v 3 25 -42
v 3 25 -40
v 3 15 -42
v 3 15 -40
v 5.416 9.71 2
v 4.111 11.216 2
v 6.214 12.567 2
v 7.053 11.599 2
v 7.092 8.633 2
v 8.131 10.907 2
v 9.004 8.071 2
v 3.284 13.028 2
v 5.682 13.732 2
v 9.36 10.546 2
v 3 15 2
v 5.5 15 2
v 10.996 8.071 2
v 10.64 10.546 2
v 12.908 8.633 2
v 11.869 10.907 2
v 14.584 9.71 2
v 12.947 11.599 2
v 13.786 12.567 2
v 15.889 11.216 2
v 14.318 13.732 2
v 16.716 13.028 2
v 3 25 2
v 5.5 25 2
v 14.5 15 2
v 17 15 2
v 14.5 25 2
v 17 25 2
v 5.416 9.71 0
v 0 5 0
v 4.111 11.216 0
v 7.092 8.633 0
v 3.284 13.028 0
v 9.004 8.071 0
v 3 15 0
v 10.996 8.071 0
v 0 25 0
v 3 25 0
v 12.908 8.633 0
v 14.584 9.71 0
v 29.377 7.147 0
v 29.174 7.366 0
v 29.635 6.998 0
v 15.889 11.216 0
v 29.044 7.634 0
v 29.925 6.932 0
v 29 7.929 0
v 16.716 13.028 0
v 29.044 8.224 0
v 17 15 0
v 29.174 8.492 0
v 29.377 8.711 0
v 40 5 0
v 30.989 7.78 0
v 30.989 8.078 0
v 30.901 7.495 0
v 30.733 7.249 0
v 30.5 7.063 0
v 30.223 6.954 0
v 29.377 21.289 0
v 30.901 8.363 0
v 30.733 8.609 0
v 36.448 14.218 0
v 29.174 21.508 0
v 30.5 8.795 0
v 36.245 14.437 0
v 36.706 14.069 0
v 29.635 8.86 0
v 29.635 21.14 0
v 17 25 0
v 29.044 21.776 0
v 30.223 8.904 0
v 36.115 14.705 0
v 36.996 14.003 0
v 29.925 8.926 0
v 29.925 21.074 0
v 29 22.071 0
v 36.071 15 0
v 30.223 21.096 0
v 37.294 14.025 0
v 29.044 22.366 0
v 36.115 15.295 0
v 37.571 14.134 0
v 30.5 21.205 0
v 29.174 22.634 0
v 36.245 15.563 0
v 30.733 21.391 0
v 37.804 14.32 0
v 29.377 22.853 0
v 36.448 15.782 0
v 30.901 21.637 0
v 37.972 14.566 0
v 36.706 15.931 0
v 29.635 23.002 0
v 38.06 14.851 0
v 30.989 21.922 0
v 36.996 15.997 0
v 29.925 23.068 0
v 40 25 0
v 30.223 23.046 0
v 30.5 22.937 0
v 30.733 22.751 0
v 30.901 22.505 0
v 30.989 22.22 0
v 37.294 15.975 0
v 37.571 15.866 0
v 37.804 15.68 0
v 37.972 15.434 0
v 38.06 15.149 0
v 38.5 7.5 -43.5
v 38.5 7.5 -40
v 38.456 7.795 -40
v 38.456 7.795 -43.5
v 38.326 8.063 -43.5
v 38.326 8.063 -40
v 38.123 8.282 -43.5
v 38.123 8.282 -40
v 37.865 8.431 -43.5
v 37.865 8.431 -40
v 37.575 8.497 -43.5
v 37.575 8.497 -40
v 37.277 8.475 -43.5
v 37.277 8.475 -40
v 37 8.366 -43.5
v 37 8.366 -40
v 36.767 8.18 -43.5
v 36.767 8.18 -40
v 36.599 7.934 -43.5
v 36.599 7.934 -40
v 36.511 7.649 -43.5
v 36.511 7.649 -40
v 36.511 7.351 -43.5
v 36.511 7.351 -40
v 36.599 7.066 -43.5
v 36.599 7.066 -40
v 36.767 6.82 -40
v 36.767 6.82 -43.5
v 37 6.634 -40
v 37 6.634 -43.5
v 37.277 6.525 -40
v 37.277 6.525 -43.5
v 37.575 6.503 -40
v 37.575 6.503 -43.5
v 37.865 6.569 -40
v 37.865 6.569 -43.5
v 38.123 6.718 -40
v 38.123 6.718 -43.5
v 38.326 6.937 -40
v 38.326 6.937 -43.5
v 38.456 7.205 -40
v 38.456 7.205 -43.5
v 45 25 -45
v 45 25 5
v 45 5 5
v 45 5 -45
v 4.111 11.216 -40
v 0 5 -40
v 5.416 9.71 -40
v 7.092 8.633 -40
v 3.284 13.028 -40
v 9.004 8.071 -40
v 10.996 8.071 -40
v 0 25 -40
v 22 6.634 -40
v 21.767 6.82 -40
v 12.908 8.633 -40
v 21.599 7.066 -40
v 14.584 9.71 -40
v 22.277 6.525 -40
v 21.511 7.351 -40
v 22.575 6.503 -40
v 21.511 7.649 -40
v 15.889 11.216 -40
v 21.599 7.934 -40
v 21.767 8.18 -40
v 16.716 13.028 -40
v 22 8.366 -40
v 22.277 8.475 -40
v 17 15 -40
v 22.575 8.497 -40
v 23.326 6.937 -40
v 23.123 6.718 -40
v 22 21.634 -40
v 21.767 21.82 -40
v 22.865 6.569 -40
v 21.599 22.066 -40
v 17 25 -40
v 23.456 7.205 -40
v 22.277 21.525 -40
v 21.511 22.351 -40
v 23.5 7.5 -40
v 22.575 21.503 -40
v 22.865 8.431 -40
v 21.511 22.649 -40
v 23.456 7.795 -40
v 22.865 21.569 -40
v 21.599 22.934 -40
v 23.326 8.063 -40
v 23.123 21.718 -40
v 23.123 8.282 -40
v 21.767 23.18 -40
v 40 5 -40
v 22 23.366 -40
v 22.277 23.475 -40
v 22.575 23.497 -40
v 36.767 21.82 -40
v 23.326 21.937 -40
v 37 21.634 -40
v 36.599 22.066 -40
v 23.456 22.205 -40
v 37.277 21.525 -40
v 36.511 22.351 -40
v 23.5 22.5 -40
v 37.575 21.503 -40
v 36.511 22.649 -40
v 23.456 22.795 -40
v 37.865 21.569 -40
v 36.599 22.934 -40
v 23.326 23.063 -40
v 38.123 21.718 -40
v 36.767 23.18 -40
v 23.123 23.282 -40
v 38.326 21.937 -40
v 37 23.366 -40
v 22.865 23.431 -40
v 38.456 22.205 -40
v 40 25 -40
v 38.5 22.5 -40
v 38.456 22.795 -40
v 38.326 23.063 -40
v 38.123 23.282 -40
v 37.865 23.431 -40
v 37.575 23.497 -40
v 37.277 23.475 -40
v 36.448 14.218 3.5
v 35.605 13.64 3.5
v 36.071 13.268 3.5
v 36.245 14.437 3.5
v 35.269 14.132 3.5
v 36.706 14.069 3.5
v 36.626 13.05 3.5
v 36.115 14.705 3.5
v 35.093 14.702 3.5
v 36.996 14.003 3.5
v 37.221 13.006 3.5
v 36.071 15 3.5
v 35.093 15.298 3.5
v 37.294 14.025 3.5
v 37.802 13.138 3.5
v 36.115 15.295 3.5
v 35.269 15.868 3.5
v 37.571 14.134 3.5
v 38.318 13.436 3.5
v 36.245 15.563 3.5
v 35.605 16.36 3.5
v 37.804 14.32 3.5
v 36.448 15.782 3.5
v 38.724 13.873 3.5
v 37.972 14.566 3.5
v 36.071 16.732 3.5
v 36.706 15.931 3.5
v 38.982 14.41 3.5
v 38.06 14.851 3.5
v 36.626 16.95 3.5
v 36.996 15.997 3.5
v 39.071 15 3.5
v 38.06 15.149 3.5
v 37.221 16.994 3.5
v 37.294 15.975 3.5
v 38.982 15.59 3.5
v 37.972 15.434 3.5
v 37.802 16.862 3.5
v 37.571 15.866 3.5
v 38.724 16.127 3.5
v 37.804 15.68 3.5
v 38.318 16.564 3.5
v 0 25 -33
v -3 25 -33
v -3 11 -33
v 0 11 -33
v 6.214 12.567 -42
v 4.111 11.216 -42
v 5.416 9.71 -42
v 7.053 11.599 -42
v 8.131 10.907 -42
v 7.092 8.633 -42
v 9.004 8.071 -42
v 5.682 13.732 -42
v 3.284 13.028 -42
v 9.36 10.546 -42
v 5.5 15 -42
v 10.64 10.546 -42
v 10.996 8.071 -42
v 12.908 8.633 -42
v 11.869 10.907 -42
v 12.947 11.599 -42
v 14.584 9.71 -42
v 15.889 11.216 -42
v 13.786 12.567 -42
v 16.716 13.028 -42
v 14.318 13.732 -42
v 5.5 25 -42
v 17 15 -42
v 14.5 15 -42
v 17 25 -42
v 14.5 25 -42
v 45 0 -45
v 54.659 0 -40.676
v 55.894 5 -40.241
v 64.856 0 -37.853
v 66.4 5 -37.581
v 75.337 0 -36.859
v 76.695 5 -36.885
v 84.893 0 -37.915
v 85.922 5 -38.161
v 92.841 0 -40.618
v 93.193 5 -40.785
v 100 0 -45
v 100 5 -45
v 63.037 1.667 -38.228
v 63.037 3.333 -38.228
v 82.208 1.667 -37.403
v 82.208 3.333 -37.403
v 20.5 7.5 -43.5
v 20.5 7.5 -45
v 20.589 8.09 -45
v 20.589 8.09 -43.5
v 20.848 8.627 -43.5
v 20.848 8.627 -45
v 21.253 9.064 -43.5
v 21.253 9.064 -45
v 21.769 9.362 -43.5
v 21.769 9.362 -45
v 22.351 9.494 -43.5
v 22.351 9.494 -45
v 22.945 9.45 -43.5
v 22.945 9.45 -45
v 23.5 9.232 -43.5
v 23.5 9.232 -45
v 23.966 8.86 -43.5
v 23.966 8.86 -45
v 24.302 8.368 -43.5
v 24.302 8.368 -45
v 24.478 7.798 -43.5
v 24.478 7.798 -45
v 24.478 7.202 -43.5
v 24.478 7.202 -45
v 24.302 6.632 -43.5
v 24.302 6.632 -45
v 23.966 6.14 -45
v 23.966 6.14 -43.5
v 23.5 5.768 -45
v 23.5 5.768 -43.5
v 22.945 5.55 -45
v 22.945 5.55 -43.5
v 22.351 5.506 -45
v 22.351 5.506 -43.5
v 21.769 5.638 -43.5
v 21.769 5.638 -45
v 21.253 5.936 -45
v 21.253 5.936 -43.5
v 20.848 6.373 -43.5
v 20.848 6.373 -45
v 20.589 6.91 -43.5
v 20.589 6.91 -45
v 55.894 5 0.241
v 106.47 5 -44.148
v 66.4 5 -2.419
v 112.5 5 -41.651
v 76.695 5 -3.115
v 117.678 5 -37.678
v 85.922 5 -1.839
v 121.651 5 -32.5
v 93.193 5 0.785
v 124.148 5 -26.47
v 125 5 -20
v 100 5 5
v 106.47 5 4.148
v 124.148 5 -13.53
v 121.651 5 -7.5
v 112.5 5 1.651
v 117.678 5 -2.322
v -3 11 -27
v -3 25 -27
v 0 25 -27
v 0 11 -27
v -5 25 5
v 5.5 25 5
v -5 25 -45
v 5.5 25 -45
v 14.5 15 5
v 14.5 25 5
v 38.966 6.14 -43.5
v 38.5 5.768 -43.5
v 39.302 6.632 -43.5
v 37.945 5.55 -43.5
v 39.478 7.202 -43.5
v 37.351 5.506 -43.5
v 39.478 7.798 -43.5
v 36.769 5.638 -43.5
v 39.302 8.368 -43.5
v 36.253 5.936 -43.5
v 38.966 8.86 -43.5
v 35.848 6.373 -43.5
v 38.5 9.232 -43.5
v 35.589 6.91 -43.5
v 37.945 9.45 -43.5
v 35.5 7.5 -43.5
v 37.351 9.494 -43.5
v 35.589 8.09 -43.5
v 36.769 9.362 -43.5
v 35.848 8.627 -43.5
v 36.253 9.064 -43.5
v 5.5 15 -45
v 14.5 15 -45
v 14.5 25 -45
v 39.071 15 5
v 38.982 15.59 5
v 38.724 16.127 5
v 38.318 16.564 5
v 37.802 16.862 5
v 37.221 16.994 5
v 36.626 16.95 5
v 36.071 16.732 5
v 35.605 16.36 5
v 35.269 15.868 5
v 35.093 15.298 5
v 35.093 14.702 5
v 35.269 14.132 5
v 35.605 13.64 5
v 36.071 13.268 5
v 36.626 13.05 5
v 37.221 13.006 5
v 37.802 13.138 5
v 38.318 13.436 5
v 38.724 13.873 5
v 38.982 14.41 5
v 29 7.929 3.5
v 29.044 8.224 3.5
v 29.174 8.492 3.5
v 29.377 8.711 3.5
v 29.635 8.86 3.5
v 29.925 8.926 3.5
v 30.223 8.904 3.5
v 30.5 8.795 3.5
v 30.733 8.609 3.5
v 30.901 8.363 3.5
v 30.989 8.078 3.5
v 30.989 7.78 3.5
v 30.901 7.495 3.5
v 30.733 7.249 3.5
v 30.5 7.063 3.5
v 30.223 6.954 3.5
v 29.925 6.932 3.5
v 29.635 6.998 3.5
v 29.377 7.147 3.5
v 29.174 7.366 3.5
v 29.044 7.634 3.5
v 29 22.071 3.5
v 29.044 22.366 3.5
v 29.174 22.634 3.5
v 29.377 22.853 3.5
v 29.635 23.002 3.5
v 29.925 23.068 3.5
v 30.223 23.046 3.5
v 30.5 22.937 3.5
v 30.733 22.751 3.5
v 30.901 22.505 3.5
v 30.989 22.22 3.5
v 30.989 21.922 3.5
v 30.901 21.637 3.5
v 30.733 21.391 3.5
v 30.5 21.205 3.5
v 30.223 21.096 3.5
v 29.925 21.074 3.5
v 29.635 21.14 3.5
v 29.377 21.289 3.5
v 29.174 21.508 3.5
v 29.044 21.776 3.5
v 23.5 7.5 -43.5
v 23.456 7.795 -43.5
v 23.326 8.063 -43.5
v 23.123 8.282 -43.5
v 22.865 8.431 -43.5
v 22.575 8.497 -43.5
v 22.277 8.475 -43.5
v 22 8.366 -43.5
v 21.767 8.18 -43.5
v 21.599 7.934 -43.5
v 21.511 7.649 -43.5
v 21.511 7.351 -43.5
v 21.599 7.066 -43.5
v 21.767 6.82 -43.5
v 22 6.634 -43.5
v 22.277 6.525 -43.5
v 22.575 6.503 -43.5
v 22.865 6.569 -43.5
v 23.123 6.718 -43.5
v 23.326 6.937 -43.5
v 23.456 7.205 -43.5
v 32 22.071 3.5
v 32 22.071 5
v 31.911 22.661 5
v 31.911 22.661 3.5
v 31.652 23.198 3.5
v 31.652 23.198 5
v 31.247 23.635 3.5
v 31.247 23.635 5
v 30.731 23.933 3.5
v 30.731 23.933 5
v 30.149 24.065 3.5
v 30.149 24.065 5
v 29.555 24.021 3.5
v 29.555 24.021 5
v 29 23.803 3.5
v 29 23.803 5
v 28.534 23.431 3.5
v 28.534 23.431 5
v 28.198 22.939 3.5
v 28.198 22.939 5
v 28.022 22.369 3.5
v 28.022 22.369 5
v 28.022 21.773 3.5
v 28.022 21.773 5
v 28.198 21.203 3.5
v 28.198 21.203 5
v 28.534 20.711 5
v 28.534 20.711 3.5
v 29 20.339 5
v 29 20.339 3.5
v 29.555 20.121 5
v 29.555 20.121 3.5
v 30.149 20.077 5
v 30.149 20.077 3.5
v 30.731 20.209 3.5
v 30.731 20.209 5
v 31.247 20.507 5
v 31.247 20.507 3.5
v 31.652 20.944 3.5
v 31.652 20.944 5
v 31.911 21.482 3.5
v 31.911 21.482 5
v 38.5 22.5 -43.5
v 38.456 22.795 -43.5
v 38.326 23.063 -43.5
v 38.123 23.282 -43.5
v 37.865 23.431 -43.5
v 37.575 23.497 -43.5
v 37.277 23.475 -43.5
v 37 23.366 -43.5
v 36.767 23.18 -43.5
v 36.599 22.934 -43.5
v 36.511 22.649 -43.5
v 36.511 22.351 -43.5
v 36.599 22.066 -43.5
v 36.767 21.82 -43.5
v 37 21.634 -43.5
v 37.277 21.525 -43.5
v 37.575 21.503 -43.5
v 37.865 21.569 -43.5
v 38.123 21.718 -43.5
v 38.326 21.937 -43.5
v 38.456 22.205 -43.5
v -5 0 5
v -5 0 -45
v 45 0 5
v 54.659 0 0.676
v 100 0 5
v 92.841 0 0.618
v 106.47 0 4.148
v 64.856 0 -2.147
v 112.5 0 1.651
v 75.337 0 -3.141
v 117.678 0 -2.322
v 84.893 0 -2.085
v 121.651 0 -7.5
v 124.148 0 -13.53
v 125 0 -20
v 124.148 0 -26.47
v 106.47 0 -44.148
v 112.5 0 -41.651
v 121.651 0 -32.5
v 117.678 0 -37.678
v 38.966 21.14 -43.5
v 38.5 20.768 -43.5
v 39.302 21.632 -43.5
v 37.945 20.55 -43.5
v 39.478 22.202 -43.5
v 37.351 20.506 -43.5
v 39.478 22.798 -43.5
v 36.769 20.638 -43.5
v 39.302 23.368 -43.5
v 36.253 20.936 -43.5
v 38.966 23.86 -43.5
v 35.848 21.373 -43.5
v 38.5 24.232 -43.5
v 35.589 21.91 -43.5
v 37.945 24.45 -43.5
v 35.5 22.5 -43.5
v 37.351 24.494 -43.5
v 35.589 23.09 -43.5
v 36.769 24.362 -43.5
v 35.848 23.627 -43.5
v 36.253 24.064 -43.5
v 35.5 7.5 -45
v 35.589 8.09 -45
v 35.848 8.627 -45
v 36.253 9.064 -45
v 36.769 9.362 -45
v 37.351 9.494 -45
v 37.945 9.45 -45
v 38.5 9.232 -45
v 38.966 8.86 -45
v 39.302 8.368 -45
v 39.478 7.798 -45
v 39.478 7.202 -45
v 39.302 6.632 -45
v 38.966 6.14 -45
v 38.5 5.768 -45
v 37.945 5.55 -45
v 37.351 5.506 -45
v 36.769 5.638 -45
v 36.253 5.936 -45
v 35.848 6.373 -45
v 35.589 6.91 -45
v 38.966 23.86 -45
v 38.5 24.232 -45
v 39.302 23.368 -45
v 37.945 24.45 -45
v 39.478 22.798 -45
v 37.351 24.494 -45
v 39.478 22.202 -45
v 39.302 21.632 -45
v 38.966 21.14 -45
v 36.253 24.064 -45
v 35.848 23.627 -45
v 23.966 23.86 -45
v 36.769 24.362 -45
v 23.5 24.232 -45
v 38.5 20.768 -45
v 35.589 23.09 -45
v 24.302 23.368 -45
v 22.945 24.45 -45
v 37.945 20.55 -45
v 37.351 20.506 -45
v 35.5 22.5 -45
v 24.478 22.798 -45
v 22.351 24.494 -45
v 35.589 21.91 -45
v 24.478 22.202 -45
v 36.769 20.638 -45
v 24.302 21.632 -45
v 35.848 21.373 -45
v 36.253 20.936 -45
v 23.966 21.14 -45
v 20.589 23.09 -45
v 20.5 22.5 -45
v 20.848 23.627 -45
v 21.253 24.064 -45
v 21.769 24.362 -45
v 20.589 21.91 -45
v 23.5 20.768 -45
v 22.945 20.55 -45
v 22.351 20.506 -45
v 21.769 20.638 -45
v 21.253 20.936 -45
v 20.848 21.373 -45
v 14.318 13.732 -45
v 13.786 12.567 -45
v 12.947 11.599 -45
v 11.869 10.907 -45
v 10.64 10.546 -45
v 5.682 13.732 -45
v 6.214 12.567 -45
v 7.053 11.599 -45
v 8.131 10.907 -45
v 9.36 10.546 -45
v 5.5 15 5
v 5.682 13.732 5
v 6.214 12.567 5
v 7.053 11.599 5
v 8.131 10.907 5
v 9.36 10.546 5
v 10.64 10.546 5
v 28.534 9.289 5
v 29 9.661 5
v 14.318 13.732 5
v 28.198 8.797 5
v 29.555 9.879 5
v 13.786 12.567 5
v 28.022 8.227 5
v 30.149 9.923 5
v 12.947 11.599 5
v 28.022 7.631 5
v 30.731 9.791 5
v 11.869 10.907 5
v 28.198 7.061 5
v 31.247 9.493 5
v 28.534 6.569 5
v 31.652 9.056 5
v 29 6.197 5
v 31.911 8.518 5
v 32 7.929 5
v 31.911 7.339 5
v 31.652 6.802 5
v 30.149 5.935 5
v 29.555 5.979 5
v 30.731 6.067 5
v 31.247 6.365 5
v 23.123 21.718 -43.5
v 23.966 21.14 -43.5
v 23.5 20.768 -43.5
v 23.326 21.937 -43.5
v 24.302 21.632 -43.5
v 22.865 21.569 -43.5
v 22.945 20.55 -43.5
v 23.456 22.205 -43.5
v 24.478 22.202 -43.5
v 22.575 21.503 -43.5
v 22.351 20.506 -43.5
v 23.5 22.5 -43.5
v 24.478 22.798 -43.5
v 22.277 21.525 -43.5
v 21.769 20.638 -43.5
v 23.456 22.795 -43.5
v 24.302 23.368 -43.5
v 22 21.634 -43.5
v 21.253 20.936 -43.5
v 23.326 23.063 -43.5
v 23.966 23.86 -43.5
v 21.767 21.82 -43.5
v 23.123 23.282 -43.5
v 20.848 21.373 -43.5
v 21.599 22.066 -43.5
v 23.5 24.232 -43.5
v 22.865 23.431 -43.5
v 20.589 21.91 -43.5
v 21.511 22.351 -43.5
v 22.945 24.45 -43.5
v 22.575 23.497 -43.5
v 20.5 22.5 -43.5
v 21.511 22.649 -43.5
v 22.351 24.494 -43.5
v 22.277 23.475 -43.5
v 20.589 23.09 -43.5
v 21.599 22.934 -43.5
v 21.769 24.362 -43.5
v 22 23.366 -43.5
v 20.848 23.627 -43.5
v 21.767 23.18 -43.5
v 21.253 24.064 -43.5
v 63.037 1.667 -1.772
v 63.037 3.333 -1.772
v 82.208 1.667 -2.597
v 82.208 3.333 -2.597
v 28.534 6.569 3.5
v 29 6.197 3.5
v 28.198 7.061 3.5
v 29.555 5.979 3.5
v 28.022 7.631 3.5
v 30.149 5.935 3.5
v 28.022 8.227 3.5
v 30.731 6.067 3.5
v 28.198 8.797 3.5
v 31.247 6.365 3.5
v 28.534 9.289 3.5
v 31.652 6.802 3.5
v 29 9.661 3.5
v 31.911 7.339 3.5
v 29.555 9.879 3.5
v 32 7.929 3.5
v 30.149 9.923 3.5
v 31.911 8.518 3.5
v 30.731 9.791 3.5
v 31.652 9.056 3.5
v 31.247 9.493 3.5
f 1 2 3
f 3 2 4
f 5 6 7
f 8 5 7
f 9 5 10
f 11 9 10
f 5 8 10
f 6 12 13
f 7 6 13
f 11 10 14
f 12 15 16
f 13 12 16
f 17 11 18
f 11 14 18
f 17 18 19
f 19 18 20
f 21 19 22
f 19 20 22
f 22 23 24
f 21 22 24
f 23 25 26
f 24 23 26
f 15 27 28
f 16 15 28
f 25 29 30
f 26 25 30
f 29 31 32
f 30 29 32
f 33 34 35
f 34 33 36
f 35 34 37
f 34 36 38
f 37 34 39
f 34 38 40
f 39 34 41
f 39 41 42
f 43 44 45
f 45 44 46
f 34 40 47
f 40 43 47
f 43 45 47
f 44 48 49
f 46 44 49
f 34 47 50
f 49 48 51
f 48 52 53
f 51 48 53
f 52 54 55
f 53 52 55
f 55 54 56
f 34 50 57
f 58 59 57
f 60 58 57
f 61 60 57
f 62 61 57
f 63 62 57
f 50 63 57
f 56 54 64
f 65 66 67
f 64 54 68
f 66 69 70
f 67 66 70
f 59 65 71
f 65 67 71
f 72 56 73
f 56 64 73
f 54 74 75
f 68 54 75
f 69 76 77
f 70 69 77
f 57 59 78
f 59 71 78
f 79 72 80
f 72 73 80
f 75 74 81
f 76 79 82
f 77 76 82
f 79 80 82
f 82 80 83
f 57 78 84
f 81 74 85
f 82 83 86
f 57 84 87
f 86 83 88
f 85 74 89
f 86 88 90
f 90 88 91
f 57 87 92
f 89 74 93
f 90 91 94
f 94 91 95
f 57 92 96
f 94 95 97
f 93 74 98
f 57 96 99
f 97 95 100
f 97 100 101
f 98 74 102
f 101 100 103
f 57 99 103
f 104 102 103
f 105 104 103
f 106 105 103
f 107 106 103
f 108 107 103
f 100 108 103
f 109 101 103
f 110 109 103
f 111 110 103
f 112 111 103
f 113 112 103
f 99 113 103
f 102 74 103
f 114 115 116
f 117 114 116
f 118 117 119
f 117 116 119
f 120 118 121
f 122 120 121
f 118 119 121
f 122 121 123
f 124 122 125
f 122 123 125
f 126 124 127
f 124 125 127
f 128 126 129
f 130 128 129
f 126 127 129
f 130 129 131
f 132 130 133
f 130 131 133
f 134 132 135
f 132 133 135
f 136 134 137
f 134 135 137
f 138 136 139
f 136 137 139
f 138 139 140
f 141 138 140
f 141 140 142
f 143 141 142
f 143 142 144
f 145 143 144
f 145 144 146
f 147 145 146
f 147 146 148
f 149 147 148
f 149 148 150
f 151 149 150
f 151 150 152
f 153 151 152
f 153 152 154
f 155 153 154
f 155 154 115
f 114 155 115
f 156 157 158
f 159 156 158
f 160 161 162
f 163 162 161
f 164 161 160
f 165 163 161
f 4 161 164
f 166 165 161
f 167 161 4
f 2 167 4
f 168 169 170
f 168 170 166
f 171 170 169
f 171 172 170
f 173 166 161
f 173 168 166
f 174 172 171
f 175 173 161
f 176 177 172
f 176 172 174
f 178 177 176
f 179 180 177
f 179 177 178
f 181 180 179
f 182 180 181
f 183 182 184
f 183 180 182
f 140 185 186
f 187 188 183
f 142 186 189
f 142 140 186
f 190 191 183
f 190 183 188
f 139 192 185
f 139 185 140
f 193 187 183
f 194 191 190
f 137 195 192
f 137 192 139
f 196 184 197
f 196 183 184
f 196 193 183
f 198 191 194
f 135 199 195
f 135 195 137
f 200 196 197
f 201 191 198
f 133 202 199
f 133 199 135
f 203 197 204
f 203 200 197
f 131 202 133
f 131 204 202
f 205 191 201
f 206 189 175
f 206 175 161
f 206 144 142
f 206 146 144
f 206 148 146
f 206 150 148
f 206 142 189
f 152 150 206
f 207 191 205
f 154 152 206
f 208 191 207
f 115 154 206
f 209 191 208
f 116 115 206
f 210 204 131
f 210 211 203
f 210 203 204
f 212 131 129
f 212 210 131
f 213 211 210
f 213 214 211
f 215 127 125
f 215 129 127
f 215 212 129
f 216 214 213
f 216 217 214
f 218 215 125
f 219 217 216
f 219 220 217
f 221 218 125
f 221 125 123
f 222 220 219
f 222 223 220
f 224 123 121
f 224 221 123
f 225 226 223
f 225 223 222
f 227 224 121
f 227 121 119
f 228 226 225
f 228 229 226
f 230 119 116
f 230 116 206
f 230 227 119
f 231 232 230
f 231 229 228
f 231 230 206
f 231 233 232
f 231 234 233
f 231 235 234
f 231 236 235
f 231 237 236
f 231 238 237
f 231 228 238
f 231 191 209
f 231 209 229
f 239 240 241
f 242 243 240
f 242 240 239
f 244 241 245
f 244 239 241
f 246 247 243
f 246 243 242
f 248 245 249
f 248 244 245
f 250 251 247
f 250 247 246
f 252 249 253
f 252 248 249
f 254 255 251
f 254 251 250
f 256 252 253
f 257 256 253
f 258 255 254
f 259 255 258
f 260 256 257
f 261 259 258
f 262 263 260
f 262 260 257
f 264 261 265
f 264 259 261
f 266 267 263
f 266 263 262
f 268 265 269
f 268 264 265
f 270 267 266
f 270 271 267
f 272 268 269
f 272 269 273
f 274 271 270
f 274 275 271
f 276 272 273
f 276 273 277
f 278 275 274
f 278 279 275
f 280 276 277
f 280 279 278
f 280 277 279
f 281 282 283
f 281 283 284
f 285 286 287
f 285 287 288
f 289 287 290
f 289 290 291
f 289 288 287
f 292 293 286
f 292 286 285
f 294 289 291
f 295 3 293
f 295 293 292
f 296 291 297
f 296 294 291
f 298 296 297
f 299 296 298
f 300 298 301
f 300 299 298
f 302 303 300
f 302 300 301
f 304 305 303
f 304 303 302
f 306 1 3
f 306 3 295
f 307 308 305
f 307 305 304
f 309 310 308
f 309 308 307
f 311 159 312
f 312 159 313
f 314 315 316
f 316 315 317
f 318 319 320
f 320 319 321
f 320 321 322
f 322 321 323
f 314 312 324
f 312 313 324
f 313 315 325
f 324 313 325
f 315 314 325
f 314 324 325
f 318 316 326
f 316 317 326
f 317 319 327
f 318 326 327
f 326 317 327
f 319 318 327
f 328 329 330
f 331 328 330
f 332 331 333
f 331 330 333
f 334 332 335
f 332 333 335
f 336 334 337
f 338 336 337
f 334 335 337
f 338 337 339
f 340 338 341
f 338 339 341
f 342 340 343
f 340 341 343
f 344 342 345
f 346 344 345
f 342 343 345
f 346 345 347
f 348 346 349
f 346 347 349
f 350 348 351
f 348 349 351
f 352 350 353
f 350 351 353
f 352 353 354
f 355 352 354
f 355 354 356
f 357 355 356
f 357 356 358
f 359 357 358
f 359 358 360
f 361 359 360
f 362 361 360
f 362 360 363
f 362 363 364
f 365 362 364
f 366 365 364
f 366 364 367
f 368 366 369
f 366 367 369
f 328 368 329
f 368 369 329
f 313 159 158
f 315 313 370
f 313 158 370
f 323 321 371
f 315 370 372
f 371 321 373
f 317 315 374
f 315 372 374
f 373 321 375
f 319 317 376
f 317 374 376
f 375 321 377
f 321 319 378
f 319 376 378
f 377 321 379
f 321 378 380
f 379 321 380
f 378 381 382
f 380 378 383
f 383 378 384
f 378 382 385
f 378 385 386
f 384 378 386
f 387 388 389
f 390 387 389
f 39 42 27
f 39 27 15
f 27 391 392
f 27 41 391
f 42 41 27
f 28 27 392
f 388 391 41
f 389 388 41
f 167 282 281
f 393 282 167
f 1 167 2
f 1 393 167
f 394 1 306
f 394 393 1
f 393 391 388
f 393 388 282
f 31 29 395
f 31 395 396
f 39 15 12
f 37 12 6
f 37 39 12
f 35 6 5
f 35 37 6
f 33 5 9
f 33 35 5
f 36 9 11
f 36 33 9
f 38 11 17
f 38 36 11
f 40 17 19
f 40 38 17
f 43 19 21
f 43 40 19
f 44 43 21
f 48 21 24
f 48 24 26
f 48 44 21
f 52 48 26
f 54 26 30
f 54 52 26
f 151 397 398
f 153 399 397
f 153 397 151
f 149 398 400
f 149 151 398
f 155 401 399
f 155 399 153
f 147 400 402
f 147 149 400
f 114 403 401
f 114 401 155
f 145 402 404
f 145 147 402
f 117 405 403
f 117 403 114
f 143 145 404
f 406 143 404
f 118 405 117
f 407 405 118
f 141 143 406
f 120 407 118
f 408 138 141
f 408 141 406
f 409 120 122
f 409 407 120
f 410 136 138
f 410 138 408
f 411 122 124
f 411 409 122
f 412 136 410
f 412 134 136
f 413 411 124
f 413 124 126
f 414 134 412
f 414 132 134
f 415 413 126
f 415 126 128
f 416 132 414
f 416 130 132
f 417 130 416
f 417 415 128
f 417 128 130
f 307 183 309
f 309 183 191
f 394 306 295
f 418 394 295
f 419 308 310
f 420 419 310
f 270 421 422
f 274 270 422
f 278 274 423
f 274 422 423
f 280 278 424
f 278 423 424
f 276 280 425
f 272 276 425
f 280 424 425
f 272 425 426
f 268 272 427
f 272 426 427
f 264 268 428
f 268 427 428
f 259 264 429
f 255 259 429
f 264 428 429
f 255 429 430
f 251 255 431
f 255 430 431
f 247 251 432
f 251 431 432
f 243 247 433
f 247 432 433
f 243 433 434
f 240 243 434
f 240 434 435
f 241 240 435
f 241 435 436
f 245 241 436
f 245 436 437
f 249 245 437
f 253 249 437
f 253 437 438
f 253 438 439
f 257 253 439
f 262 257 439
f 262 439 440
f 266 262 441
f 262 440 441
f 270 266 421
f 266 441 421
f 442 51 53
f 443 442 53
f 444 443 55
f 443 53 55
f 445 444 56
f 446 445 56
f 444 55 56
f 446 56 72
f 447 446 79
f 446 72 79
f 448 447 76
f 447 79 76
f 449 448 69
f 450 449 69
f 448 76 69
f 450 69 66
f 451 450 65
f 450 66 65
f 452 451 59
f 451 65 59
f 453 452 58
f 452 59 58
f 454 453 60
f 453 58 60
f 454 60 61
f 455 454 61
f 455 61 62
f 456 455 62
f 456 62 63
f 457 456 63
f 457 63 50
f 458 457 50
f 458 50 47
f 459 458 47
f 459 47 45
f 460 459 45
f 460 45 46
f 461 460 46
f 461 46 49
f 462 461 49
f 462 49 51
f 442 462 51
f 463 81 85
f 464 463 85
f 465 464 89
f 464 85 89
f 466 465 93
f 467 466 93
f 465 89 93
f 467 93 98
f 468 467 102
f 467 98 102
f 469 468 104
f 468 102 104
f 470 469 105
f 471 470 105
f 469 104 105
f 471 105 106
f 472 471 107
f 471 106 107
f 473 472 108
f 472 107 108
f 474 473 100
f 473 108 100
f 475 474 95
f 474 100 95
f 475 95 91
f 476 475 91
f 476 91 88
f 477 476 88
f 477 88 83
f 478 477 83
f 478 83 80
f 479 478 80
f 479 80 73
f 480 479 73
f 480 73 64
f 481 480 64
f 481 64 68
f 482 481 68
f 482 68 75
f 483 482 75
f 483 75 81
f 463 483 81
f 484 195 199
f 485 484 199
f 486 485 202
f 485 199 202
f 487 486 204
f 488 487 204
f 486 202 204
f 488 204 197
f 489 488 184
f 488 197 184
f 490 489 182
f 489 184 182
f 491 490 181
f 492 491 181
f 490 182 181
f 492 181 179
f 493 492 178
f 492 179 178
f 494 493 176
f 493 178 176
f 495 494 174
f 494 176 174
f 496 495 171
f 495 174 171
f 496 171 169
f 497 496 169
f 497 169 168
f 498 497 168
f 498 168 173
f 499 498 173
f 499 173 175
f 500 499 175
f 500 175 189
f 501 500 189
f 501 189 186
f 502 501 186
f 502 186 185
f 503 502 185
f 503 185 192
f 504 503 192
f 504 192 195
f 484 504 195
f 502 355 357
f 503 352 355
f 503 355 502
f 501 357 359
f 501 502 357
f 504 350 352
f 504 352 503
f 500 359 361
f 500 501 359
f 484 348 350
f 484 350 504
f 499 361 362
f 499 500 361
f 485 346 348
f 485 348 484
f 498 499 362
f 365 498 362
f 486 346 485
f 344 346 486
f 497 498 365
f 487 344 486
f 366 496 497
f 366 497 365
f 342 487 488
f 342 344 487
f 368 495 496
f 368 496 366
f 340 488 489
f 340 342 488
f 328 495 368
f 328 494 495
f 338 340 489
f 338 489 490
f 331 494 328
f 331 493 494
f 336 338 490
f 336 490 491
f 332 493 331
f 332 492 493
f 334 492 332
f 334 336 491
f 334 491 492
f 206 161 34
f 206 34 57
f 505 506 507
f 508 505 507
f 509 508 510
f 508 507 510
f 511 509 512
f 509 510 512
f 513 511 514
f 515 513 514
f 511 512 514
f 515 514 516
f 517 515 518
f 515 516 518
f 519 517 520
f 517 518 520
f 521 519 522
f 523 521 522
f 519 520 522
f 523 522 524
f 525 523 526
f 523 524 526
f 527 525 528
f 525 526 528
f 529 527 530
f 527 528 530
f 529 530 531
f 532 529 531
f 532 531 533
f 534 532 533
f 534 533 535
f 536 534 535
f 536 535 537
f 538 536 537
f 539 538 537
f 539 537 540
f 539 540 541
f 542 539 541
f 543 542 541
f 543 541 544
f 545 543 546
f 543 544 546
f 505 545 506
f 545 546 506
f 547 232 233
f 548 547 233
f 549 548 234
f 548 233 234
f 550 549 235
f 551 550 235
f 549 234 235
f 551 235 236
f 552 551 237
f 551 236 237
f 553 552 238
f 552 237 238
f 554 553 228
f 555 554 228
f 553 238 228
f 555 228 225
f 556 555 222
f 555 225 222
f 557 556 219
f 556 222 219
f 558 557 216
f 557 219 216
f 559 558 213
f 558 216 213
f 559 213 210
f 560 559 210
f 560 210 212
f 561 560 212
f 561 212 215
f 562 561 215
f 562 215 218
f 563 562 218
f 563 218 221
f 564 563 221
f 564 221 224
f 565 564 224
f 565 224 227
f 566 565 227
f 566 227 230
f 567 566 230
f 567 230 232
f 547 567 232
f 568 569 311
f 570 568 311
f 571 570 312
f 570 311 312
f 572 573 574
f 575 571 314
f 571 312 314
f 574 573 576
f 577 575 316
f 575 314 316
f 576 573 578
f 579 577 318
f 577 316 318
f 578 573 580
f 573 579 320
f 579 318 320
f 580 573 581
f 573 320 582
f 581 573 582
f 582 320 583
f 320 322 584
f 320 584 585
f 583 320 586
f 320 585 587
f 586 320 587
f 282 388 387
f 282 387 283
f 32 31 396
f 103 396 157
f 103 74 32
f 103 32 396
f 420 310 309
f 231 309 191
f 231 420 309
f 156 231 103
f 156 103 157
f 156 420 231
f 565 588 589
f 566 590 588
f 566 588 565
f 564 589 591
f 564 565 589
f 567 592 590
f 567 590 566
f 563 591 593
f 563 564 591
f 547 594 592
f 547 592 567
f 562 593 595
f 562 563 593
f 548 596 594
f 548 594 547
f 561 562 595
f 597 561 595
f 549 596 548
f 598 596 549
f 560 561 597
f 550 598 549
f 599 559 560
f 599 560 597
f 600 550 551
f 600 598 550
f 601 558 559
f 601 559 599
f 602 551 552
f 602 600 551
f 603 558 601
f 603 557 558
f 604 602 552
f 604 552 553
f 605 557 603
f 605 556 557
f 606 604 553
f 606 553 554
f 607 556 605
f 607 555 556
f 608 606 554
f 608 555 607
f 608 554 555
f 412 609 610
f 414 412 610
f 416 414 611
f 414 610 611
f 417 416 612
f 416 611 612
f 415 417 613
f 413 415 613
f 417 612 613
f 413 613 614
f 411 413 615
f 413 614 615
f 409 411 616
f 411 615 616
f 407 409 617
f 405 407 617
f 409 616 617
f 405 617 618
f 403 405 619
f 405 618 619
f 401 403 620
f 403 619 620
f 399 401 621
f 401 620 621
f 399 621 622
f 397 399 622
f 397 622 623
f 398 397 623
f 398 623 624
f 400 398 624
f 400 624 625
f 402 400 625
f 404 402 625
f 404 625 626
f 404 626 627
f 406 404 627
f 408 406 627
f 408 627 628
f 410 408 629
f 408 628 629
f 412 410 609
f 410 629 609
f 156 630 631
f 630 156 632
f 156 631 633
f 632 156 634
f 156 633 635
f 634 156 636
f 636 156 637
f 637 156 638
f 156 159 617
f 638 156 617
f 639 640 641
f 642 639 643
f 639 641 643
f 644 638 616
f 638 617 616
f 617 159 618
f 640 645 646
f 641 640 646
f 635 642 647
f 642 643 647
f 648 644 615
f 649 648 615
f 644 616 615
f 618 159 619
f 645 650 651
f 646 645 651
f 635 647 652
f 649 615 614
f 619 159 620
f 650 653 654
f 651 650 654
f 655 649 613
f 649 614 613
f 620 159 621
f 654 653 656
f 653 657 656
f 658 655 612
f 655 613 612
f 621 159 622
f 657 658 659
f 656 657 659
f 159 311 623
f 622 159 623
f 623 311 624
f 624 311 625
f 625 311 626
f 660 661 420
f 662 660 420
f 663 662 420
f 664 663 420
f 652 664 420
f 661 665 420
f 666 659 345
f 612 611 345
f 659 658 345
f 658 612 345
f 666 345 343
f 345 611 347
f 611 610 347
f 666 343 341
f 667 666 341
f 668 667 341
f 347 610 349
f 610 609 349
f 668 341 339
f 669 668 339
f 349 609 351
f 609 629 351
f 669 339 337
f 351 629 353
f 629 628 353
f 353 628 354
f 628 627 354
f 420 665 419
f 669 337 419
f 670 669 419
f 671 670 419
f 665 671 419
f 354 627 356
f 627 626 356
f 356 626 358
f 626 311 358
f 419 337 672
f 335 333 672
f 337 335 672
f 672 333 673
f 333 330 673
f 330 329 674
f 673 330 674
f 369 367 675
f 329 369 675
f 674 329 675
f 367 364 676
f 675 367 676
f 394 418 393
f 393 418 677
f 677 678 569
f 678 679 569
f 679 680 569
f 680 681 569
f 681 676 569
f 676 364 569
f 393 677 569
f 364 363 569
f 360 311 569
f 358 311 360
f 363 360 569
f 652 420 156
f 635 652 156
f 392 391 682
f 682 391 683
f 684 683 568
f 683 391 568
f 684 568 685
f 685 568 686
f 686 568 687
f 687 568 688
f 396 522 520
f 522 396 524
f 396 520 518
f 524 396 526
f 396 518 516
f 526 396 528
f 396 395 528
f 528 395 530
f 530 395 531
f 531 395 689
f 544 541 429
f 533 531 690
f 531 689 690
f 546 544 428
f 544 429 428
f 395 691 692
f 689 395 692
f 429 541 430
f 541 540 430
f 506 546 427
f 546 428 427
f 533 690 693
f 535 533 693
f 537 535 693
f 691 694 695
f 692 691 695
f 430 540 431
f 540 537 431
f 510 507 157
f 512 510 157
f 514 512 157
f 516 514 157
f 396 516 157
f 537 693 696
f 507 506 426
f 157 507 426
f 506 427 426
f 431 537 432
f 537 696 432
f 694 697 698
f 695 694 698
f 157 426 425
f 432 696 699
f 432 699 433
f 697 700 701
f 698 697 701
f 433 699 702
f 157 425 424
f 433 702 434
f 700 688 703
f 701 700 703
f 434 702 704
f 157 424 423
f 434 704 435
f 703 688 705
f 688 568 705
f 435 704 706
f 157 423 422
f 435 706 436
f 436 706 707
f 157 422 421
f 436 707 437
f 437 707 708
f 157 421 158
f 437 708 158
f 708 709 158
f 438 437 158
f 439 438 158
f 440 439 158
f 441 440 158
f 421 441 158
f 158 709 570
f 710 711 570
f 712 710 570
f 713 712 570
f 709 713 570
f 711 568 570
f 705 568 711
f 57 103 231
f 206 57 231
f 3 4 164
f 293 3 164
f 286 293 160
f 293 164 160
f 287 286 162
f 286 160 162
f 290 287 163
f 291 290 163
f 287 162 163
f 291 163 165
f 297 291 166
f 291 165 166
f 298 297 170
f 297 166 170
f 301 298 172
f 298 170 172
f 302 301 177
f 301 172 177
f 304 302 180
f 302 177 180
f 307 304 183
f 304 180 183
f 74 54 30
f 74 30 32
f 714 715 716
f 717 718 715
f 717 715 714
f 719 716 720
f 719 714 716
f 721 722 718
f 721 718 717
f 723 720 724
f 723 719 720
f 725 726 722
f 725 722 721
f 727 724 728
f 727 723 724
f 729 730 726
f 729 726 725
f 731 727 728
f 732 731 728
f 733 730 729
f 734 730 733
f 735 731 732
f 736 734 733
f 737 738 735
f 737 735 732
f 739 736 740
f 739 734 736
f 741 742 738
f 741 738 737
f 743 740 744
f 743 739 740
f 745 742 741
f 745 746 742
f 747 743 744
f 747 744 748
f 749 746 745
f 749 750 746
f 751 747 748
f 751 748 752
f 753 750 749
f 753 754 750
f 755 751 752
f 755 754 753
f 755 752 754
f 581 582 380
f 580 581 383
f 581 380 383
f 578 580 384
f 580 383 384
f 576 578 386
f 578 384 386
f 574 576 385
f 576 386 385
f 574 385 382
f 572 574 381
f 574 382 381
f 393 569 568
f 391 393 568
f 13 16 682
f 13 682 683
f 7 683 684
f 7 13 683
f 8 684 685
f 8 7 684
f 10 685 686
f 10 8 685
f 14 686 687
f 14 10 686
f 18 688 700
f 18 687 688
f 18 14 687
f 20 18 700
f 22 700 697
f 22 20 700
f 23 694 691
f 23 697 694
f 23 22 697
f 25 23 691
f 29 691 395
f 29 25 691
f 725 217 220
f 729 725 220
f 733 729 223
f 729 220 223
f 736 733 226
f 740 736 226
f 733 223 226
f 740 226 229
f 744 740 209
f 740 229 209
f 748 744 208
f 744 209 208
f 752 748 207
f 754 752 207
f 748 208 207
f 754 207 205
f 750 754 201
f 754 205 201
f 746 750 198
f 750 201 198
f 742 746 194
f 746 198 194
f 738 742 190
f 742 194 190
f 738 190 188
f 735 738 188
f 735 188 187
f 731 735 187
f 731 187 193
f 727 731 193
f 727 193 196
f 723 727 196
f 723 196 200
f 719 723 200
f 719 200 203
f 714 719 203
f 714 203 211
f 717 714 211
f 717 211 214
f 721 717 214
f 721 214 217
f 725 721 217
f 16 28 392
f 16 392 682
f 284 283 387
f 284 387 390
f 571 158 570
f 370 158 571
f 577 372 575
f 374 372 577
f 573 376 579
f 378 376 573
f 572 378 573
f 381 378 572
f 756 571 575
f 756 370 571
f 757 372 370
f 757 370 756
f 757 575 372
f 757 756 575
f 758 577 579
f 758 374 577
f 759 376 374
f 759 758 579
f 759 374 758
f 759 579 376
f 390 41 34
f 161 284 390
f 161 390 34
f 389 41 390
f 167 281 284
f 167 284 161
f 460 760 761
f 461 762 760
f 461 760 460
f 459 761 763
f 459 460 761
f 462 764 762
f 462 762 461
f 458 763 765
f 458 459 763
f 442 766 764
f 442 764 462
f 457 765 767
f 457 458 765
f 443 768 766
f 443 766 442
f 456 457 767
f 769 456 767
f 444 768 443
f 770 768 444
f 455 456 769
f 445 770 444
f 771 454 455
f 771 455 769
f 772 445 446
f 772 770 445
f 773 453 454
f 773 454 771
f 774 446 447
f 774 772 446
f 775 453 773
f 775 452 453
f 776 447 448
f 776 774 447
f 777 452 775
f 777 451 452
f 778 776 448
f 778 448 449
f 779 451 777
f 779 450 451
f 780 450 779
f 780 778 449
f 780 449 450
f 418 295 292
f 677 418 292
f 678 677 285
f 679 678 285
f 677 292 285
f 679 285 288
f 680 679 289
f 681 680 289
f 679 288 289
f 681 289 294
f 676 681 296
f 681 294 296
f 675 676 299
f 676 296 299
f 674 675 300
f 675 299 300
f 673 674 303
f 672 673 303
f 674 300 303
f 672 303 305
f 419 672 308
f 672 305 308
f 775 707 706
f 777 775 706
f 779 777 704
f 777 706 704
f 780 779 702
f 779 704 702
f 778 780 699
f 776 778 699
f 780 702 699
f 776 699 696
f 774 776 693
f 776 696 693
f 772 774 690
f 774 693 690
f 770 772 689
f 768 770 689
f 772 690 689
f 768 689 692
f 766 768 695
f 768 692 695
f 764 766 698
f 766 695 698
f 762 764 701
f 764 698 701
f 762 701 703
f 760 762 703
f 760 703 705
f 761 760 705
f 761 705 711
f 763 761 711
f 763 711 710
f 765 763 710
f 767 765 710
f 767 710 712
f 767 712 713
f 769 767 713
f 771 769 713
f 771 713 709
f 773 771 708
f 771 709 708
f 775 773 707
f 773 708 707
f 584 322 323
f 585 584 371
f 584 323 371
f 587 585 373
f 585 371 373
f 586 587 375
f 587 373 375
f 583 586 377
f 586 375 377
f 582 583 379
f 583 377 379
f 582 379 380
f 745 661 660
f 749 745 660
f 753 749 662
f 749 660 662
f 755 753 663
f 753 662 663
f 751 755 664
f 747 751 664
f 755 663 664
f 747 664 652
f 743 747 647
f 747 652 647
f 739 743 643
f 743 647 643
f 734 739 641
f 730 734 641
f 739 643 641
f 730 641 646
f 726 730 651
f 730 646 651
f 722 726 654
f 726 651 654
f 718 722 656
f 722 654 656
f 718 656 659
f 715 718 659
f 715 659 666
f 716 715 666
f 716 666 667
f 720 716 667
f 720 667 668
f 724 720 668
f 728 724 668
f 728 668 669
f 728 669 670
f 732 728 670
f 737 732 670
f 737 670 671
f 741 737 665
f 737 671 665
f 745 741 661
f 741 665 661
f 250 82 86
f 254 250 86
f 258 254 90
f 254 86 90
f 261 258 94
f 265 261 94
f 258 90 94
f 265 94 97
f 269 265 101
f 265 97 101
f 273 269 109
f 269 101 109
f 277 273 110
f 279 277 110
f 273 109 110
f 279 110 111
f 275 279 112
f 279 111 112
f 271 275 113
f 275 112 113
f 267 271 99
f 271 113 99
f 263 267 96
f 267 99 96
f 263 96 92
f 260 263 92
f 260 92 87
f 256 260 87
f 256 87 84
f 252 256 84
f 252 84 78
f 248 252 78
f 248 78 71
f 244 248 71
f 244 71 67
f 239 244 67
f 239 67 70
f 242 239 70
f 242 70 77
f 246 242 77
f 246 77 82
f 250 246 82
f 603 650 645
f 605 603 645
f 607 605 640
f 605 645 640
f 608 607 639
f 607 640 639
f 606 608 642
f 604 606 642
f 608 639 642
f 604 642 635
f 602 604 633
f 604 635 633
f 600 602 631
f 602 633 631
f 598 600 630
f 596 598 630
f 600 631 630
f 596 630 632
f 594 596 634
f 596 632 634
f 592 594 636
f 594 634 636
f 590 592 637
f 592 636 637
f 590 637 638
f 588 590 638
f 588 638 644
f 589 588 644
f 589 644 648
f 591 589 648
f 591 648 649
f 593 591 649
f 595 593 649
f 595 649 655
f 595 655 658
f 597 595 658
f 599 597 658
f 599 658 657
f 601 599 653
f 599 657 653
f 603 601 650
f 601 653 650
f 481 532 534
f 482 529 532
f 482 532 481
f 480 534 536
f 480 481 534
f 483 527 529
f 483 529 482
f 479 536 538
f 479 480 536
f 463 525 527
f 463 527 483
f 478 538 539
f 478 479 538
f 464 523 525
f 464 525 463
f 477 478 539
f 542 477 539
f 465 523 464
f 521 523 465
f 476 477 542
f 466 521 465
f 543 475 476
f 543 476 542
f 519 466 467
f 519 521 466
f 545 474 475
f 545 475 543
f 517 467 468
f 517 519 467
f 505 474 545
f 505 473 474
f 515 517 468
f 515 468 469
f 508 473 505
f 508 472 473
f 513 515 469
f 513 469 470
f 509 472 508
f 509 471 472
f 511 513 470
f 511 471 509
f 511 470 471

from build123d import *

# Parameters (mm, degrees)
SALIENTE_EXTRUIR1_DEPTH    = 25
CROQUIS2_W                 = 40
CROQUIS2_H                 = 40
CORTAR_EXTRUIR1_DEPTH      = 20
CORTAR_EXTRUIR2_DEPTH      = 70
CORTAR_EXTRUIR2_DEPTH_BACK = 20
CORTAR_EXTRUIR3_DEPTH      = 42
CORTAR_EXTRUIR3_DEPTH_BACK = 2
CROQUIS8_R                 = 1
CORTAR_EXTRUIR7_DEPTH      = 10
CROQUIS9_R                 = 1
CORTAR_EXTRUIR8_DEPTH      = 10
CROQUIS10_R                = 2
CORTAR_EXTRUIR9_DEPTH      = 1.5
CROQUIS11_R                = 2
CORTAR_EXTRUIR10_DEPTH     = 1.5
CORTAR_EXTRUIR11_DEPTH     = 70
CORTAR_EXTRUIR12_DEPTH     = 10
CORTAR_EXTRUIR13_DEPTH     = 10
CROQUIS14_W                = 3
CROQUIS14_H                = 6
CORTAR_EXTRUIR14_DEPTH     = 14


with BuildPart() as part:
    # Croquis1 → Saliente-Extruir1 (new body)
    with BuildSketch(Plane(origin=(0, 0, 0), x_dir=(1, 0, 0), z_dir=(0, 1, 0))):
        Polygon((-5, 45), (-5, 0), (-5, -5), (125, -5), (125, 45), align=None)
    extrude(amount=SALIENTE_EXTRUIR1_DEPTH)

    # Croquis2 → Cortar-Extruir1 (cut)
    with BuildSketch(Plane(origin=(0, 25, 0), x_dir=(1, 0, 0), z_dir=(0, 1, 0))):
        with Locations((20, 20)):
            Rectangle(CROQUIS2_W, CROQUIS2_H)
    extrude(amount=-CORTAR_EXTRUIR1_DEPTH, mode=Mode.SUBTRACT)

    # Croquis3 → Cortar-Extruir2 (cut, two sides)
    with BuildSketch(Plane.XY.offset(-40)) as cortar_extruir2_sk:
        with BuildLine():
            ThreePointArc((5.5, 15), (10, 19.5), (14.5, 15))
            Line((14.5, 15), (14.5, 25))
            Line((14.5, 25), (5.5, 25))
            Line((5.5, 25), (5.5, 15))
        make_face()
        with BuildLine():
            ThreePointArc((5.5, 15), (10, 10.5), (14.5, 15))
            Line((14.5, 15), (5.5, 15))
        make_face()
        with BuildLine():
            Line((5.5, 15), (14.5, 15))
            ThreePointArc((14.5, 15), (10, 19.5), (5.5, 15))
        make_face()
    extrude(amount=CORTAR_EXTRUIR2_DEPTH, mode=Mode.SUBTRACT)
    extrude(cortar_extruir2_sk.sketch, amount=-CORTAR_EXTRUIR2_DEPTH_BACK, mode=Mode.SUBTRACT)

    # Croquis4 → Cortar-Extruir3 (cut, two sides)
    with BuildSketch(Plane.XY.offset(-40)) as cortar_extruir3_sk:
        with BuildLine():
            Line((14.5, 15), (17, 15))
            ThreePointArc((17, 15), (16.34428877, 17.958039892), (14.5, 20.361902647))
            Line((14.5, 20.361902647), (14.5, 15))
        make_face()
        with BuildLine():
            ThreePointArc((3, 15), (10, 8), (17, 15))
            Line((17, 15), (14.5, 15))
            ThreePointArc((14.5, 15), (10, 10.5), (5.5, 15))
            Line((5.5, 15), (3, 15))
        make_face()
        with BuildLine():
            ThreePointArc((5.5, 20.361902647), (3.65571123, 17.958039892), (3, 15))
            Line((3, 15), (5.5, 15))
            Line((5.5, 15), (5.5, 20.361902647))
        make_face()
        with BuildLine():
            Line((3, 25), (3, 15))
            ThreePointArc((3, 15), (3.65571123, 17.958039892), (5.5, 20.361902647))
            Line((5.5, 20.361902647), (5.5, 25))
            Line((5.5, 25), (3, 25))
        make_face()
        with BuildLine():
            ThreePointArc((14.5, 20.361902647), (16.34428877, 17.958039892), (17, 15))
            Line((17, 15), (17, 25))
            Line((17, 25), (14.5, 25))
            Line((14.5, 25), (14.5, 20.361902647))
        make_face()
    extrude(amount=CORTAR_EXTRUIR3_DEPTH, mode=Mode.SUBTRACT)
    extrude(cortar_extruir3_sk.sketch, amount=-CORTAR_EXTRUIR3_DEPTH_BACK, mode=Mode.SUBTRACT)

    # Croquis8 → Cortar-Extruir7 (cut)
    with BuildSketch(Plane.XY.offset(-40)):
        with Locations((37.5, 22.5)):
            Circle(CROQUIS8_R)
        with Locations((37.5, 7.5)):
            Circle(CROQUIS8_R)
        with Locations((22.5, 7.5)):
            Circle(CROQUIS8_R)
        with Locations((22.5, 22.5)):
            Circle(CROQUIS8_R)
    extrude(amount=-CORTAR_EXTRUIR7_DEPTH, mode=Mode.SUBTRACT)

    # Croquis9 → Cortar-Extruir8 (cut)
    with BuildSketch(Plane(origin=(0, 0, 0), x_dir=(-1, 0, 0), z_dir=(0, 0, -1))):
        with Locations((-30, 22.071067812)):
            Circle(CROQUIS9_R)
        with Locations((-37.071067812, 15)):
            Circle(CROQUIS9_R)
        with Locations((-30, 7.928932188)):
            Circle(CROQUIS9_R)
    extrude(amount=-CORTAR_EXTRUIR8_DEPTH, mode=Mode.SUBTRACT)

    # Croquis10 → Cortar-Extruir9 (cut)
    with BuildSketch(Plane(origin=(0, 0, -45), x_dir=(-1, 0, 0), z_dir=(0, 0, -1))):
        with Locations((-22.5, 22.5)):
            Circle(CROQUIS10_R)
        with Locations((-22.5, 7.5)):
            Circle(CROQUIS10_R)
        with Locations((-37.5, 7.5)):
            Circle(CROQUIS10_R)
        with Locations((-37.5, 22.5)):
            Circle(CROQUIS10_R)
    extrude(amount=-CORTAR_EXTRUIR9_DEPTH, mode=Mode.SUBTRACT)

    # Croquis11 → Cortar-Extruir10 (cut)
    with BuildSketch(Plane.XY.offset(5)):
        with Locations((30, 22.071067812)):
            Circle(CROQUIS11_R)
        with Locations((37.071067812, 15)):
            Circle(CROQUIS11_R)
        with Locations((30, 7.928932188)):
            Circle(CROQUIS11_R)
    extrude(amount=-CORTAR_EXTRUIR10_DEPTH, mode=Mode.SUBTRACT)

    # Croquis6 → Cortar-Extruir11 (cut)
    with BuildSketch(Plane.XY.offset(5)):
        with BuildLine():
            ThreePointArc((45, 14.616328231), (64.430156973, 7.437849736), (85, 5))
            ThreePointArc((85, 5), (105.569843027, 7.437849736), (125, 14.616328231))
            Line((125, 14.616328231), (125, 25))
            Line((125, 25), (45, 25))
            Line((45, 25), (45, 14.616328231))
        make_face()
        with BuildLine():
            ThreePointArc((125, 14.616328231), (105.569843027, 7.437849736), (85, 5))
            Line((85, 5), (115.083217913, 5))
            ThreePointArc((115.083217913, 5), (120.099831147, 6.87798276), (125, 9.041677006))
            Line((125, 9.041677006), (125, 14.616328231))
        make_face()
        with BuildLine():
            ThreePointArc((125, 9.041677006), (120.099831147, 6.87798276), (115.083217913, 5))
            Line((115.083217913, 5), (125, 5))
            Line((125, 5), (125, 9.041677006))
        make_face()
        with BuildLine():
            Line((54.916782087, 5), (85, 5))
            ThreePointArc((85, 5), (64.430156973, 7.437849736), (45, 14.616328231))
            Line((45, 14.616328231), (45, 9.041677006))
            ThreePointArc((45, 9.041677006), (49.900168853, 6.87798276), (54.916782087, 5))
        make_face()
        with BuildLine():
            Line((45, 5), (54.916782087, 5))
            ThreePointArc((54.916782087, 5), (49.900168853, 6.87798276), (45, 9.041677006))
            Line((45, 9.041677006), (45, 5))
        make_face()
    extrude(amount=-CORTAR_EXTRUIR11_DEPTH, mode=Mode.SUBTRACT)

    # Croquis12 → Cortar-Extruir12 (cut)
    with BuildSketch(Plane(origin=(0, 5, 0), x_dir=(1, 0, 0), z_dir=(0, 1, 0))):
        Polygon((108.263538332, 57.3224396), (100, 45), (125, 45), (125, 20), (125, -5), (100, -5), (92.796515759, -13.049468459), (132.437262959, -23.501277263), (155.434902904, 7.824857744), (139.962048677, 54.254841825), align=None)
        with BuildLine():
            Line((125, -5), (125, 20))
            ThreePointArc((125, 20), (117.67766953, 2.32233047), (100, -5))
            Line((100, -5), (125, -5))
        make_face()
        with BuildLine():
            Line((125, 45), (100, 45))
            ThreePointArc((100, 45), (117.67766953, 37.67766953), (125, 20))
            Line((125, 20), (125, 45))
        make_face()
    extrude(amount=-CORTAR_EXTRUIR12_DEPTH, mode=Mode.SUBTRACT)

    # Croquis13 → Cortar-Extruir13 (cut)
    with BuildSketch(Plane(origin=(0, 5, 0), x_dir=(1, 0, 0), z_dir=(0, 1, 0))):
        with BuildLine():
            Line((100, 45), (136.076424828, 53.027802714))
            Line((136.076424828, 53.027802714), (154.686517999, 18.057188076))
            Line((154.686517999, 18.057188076), (135.411120125, -29.058819331))
            Line((135.411120125, -29.058819331), (100, -5))
            add(Edge.make_bspline(
                [(45, -5), (61.631849348, 3.922329445), (83.736441822, 7.63137214), (100, -5)],
                knots=[0, 0, 0, 0, 1, 1, 1, 1], degree=3))
            Line((45, -5), (-2.569566086, -27.480051403))
            Line((-2.569566086, -27.480051403), (140.150106541, -43.115071719))
            Line((140.150106541, -43.115071719), (174.827779806, 24.436234005))
            Line((174.827779806, 24.436234005), (136.076424828, 62.541584801))
            Line((136.076424828, 62.541584801), (45, 45))
            add(Edge.make_bspline(
                [(45, 45), (61.631849348, 36.077670555), (83.736441822, 32.36862786), (100, 45)],
                knots=[0, 0, 0, 0, 1, 1, 1, 1], degree=3))
        make_face()
    extrude(amount=-CORTAR_EXTRUIR13_DEPTH, mode=Mode.SUBTRACT)

    # Croquis14 → Cortar-Extruir14 (cut)
    with BuildSketch(Plane(origin=(0, 25, 0), x_dir=(1, 0, 0), z_dir=(0, 1, 0))):
        with Locations((-1.5, 30)):
            Rectangle(CROQUIS14_W, CROQUIS14_H)
    extrude(amount=-CORTAR_EXTRUIR14_DEPTH, mode=Mode.SUBTRACT)


solid = part.part
